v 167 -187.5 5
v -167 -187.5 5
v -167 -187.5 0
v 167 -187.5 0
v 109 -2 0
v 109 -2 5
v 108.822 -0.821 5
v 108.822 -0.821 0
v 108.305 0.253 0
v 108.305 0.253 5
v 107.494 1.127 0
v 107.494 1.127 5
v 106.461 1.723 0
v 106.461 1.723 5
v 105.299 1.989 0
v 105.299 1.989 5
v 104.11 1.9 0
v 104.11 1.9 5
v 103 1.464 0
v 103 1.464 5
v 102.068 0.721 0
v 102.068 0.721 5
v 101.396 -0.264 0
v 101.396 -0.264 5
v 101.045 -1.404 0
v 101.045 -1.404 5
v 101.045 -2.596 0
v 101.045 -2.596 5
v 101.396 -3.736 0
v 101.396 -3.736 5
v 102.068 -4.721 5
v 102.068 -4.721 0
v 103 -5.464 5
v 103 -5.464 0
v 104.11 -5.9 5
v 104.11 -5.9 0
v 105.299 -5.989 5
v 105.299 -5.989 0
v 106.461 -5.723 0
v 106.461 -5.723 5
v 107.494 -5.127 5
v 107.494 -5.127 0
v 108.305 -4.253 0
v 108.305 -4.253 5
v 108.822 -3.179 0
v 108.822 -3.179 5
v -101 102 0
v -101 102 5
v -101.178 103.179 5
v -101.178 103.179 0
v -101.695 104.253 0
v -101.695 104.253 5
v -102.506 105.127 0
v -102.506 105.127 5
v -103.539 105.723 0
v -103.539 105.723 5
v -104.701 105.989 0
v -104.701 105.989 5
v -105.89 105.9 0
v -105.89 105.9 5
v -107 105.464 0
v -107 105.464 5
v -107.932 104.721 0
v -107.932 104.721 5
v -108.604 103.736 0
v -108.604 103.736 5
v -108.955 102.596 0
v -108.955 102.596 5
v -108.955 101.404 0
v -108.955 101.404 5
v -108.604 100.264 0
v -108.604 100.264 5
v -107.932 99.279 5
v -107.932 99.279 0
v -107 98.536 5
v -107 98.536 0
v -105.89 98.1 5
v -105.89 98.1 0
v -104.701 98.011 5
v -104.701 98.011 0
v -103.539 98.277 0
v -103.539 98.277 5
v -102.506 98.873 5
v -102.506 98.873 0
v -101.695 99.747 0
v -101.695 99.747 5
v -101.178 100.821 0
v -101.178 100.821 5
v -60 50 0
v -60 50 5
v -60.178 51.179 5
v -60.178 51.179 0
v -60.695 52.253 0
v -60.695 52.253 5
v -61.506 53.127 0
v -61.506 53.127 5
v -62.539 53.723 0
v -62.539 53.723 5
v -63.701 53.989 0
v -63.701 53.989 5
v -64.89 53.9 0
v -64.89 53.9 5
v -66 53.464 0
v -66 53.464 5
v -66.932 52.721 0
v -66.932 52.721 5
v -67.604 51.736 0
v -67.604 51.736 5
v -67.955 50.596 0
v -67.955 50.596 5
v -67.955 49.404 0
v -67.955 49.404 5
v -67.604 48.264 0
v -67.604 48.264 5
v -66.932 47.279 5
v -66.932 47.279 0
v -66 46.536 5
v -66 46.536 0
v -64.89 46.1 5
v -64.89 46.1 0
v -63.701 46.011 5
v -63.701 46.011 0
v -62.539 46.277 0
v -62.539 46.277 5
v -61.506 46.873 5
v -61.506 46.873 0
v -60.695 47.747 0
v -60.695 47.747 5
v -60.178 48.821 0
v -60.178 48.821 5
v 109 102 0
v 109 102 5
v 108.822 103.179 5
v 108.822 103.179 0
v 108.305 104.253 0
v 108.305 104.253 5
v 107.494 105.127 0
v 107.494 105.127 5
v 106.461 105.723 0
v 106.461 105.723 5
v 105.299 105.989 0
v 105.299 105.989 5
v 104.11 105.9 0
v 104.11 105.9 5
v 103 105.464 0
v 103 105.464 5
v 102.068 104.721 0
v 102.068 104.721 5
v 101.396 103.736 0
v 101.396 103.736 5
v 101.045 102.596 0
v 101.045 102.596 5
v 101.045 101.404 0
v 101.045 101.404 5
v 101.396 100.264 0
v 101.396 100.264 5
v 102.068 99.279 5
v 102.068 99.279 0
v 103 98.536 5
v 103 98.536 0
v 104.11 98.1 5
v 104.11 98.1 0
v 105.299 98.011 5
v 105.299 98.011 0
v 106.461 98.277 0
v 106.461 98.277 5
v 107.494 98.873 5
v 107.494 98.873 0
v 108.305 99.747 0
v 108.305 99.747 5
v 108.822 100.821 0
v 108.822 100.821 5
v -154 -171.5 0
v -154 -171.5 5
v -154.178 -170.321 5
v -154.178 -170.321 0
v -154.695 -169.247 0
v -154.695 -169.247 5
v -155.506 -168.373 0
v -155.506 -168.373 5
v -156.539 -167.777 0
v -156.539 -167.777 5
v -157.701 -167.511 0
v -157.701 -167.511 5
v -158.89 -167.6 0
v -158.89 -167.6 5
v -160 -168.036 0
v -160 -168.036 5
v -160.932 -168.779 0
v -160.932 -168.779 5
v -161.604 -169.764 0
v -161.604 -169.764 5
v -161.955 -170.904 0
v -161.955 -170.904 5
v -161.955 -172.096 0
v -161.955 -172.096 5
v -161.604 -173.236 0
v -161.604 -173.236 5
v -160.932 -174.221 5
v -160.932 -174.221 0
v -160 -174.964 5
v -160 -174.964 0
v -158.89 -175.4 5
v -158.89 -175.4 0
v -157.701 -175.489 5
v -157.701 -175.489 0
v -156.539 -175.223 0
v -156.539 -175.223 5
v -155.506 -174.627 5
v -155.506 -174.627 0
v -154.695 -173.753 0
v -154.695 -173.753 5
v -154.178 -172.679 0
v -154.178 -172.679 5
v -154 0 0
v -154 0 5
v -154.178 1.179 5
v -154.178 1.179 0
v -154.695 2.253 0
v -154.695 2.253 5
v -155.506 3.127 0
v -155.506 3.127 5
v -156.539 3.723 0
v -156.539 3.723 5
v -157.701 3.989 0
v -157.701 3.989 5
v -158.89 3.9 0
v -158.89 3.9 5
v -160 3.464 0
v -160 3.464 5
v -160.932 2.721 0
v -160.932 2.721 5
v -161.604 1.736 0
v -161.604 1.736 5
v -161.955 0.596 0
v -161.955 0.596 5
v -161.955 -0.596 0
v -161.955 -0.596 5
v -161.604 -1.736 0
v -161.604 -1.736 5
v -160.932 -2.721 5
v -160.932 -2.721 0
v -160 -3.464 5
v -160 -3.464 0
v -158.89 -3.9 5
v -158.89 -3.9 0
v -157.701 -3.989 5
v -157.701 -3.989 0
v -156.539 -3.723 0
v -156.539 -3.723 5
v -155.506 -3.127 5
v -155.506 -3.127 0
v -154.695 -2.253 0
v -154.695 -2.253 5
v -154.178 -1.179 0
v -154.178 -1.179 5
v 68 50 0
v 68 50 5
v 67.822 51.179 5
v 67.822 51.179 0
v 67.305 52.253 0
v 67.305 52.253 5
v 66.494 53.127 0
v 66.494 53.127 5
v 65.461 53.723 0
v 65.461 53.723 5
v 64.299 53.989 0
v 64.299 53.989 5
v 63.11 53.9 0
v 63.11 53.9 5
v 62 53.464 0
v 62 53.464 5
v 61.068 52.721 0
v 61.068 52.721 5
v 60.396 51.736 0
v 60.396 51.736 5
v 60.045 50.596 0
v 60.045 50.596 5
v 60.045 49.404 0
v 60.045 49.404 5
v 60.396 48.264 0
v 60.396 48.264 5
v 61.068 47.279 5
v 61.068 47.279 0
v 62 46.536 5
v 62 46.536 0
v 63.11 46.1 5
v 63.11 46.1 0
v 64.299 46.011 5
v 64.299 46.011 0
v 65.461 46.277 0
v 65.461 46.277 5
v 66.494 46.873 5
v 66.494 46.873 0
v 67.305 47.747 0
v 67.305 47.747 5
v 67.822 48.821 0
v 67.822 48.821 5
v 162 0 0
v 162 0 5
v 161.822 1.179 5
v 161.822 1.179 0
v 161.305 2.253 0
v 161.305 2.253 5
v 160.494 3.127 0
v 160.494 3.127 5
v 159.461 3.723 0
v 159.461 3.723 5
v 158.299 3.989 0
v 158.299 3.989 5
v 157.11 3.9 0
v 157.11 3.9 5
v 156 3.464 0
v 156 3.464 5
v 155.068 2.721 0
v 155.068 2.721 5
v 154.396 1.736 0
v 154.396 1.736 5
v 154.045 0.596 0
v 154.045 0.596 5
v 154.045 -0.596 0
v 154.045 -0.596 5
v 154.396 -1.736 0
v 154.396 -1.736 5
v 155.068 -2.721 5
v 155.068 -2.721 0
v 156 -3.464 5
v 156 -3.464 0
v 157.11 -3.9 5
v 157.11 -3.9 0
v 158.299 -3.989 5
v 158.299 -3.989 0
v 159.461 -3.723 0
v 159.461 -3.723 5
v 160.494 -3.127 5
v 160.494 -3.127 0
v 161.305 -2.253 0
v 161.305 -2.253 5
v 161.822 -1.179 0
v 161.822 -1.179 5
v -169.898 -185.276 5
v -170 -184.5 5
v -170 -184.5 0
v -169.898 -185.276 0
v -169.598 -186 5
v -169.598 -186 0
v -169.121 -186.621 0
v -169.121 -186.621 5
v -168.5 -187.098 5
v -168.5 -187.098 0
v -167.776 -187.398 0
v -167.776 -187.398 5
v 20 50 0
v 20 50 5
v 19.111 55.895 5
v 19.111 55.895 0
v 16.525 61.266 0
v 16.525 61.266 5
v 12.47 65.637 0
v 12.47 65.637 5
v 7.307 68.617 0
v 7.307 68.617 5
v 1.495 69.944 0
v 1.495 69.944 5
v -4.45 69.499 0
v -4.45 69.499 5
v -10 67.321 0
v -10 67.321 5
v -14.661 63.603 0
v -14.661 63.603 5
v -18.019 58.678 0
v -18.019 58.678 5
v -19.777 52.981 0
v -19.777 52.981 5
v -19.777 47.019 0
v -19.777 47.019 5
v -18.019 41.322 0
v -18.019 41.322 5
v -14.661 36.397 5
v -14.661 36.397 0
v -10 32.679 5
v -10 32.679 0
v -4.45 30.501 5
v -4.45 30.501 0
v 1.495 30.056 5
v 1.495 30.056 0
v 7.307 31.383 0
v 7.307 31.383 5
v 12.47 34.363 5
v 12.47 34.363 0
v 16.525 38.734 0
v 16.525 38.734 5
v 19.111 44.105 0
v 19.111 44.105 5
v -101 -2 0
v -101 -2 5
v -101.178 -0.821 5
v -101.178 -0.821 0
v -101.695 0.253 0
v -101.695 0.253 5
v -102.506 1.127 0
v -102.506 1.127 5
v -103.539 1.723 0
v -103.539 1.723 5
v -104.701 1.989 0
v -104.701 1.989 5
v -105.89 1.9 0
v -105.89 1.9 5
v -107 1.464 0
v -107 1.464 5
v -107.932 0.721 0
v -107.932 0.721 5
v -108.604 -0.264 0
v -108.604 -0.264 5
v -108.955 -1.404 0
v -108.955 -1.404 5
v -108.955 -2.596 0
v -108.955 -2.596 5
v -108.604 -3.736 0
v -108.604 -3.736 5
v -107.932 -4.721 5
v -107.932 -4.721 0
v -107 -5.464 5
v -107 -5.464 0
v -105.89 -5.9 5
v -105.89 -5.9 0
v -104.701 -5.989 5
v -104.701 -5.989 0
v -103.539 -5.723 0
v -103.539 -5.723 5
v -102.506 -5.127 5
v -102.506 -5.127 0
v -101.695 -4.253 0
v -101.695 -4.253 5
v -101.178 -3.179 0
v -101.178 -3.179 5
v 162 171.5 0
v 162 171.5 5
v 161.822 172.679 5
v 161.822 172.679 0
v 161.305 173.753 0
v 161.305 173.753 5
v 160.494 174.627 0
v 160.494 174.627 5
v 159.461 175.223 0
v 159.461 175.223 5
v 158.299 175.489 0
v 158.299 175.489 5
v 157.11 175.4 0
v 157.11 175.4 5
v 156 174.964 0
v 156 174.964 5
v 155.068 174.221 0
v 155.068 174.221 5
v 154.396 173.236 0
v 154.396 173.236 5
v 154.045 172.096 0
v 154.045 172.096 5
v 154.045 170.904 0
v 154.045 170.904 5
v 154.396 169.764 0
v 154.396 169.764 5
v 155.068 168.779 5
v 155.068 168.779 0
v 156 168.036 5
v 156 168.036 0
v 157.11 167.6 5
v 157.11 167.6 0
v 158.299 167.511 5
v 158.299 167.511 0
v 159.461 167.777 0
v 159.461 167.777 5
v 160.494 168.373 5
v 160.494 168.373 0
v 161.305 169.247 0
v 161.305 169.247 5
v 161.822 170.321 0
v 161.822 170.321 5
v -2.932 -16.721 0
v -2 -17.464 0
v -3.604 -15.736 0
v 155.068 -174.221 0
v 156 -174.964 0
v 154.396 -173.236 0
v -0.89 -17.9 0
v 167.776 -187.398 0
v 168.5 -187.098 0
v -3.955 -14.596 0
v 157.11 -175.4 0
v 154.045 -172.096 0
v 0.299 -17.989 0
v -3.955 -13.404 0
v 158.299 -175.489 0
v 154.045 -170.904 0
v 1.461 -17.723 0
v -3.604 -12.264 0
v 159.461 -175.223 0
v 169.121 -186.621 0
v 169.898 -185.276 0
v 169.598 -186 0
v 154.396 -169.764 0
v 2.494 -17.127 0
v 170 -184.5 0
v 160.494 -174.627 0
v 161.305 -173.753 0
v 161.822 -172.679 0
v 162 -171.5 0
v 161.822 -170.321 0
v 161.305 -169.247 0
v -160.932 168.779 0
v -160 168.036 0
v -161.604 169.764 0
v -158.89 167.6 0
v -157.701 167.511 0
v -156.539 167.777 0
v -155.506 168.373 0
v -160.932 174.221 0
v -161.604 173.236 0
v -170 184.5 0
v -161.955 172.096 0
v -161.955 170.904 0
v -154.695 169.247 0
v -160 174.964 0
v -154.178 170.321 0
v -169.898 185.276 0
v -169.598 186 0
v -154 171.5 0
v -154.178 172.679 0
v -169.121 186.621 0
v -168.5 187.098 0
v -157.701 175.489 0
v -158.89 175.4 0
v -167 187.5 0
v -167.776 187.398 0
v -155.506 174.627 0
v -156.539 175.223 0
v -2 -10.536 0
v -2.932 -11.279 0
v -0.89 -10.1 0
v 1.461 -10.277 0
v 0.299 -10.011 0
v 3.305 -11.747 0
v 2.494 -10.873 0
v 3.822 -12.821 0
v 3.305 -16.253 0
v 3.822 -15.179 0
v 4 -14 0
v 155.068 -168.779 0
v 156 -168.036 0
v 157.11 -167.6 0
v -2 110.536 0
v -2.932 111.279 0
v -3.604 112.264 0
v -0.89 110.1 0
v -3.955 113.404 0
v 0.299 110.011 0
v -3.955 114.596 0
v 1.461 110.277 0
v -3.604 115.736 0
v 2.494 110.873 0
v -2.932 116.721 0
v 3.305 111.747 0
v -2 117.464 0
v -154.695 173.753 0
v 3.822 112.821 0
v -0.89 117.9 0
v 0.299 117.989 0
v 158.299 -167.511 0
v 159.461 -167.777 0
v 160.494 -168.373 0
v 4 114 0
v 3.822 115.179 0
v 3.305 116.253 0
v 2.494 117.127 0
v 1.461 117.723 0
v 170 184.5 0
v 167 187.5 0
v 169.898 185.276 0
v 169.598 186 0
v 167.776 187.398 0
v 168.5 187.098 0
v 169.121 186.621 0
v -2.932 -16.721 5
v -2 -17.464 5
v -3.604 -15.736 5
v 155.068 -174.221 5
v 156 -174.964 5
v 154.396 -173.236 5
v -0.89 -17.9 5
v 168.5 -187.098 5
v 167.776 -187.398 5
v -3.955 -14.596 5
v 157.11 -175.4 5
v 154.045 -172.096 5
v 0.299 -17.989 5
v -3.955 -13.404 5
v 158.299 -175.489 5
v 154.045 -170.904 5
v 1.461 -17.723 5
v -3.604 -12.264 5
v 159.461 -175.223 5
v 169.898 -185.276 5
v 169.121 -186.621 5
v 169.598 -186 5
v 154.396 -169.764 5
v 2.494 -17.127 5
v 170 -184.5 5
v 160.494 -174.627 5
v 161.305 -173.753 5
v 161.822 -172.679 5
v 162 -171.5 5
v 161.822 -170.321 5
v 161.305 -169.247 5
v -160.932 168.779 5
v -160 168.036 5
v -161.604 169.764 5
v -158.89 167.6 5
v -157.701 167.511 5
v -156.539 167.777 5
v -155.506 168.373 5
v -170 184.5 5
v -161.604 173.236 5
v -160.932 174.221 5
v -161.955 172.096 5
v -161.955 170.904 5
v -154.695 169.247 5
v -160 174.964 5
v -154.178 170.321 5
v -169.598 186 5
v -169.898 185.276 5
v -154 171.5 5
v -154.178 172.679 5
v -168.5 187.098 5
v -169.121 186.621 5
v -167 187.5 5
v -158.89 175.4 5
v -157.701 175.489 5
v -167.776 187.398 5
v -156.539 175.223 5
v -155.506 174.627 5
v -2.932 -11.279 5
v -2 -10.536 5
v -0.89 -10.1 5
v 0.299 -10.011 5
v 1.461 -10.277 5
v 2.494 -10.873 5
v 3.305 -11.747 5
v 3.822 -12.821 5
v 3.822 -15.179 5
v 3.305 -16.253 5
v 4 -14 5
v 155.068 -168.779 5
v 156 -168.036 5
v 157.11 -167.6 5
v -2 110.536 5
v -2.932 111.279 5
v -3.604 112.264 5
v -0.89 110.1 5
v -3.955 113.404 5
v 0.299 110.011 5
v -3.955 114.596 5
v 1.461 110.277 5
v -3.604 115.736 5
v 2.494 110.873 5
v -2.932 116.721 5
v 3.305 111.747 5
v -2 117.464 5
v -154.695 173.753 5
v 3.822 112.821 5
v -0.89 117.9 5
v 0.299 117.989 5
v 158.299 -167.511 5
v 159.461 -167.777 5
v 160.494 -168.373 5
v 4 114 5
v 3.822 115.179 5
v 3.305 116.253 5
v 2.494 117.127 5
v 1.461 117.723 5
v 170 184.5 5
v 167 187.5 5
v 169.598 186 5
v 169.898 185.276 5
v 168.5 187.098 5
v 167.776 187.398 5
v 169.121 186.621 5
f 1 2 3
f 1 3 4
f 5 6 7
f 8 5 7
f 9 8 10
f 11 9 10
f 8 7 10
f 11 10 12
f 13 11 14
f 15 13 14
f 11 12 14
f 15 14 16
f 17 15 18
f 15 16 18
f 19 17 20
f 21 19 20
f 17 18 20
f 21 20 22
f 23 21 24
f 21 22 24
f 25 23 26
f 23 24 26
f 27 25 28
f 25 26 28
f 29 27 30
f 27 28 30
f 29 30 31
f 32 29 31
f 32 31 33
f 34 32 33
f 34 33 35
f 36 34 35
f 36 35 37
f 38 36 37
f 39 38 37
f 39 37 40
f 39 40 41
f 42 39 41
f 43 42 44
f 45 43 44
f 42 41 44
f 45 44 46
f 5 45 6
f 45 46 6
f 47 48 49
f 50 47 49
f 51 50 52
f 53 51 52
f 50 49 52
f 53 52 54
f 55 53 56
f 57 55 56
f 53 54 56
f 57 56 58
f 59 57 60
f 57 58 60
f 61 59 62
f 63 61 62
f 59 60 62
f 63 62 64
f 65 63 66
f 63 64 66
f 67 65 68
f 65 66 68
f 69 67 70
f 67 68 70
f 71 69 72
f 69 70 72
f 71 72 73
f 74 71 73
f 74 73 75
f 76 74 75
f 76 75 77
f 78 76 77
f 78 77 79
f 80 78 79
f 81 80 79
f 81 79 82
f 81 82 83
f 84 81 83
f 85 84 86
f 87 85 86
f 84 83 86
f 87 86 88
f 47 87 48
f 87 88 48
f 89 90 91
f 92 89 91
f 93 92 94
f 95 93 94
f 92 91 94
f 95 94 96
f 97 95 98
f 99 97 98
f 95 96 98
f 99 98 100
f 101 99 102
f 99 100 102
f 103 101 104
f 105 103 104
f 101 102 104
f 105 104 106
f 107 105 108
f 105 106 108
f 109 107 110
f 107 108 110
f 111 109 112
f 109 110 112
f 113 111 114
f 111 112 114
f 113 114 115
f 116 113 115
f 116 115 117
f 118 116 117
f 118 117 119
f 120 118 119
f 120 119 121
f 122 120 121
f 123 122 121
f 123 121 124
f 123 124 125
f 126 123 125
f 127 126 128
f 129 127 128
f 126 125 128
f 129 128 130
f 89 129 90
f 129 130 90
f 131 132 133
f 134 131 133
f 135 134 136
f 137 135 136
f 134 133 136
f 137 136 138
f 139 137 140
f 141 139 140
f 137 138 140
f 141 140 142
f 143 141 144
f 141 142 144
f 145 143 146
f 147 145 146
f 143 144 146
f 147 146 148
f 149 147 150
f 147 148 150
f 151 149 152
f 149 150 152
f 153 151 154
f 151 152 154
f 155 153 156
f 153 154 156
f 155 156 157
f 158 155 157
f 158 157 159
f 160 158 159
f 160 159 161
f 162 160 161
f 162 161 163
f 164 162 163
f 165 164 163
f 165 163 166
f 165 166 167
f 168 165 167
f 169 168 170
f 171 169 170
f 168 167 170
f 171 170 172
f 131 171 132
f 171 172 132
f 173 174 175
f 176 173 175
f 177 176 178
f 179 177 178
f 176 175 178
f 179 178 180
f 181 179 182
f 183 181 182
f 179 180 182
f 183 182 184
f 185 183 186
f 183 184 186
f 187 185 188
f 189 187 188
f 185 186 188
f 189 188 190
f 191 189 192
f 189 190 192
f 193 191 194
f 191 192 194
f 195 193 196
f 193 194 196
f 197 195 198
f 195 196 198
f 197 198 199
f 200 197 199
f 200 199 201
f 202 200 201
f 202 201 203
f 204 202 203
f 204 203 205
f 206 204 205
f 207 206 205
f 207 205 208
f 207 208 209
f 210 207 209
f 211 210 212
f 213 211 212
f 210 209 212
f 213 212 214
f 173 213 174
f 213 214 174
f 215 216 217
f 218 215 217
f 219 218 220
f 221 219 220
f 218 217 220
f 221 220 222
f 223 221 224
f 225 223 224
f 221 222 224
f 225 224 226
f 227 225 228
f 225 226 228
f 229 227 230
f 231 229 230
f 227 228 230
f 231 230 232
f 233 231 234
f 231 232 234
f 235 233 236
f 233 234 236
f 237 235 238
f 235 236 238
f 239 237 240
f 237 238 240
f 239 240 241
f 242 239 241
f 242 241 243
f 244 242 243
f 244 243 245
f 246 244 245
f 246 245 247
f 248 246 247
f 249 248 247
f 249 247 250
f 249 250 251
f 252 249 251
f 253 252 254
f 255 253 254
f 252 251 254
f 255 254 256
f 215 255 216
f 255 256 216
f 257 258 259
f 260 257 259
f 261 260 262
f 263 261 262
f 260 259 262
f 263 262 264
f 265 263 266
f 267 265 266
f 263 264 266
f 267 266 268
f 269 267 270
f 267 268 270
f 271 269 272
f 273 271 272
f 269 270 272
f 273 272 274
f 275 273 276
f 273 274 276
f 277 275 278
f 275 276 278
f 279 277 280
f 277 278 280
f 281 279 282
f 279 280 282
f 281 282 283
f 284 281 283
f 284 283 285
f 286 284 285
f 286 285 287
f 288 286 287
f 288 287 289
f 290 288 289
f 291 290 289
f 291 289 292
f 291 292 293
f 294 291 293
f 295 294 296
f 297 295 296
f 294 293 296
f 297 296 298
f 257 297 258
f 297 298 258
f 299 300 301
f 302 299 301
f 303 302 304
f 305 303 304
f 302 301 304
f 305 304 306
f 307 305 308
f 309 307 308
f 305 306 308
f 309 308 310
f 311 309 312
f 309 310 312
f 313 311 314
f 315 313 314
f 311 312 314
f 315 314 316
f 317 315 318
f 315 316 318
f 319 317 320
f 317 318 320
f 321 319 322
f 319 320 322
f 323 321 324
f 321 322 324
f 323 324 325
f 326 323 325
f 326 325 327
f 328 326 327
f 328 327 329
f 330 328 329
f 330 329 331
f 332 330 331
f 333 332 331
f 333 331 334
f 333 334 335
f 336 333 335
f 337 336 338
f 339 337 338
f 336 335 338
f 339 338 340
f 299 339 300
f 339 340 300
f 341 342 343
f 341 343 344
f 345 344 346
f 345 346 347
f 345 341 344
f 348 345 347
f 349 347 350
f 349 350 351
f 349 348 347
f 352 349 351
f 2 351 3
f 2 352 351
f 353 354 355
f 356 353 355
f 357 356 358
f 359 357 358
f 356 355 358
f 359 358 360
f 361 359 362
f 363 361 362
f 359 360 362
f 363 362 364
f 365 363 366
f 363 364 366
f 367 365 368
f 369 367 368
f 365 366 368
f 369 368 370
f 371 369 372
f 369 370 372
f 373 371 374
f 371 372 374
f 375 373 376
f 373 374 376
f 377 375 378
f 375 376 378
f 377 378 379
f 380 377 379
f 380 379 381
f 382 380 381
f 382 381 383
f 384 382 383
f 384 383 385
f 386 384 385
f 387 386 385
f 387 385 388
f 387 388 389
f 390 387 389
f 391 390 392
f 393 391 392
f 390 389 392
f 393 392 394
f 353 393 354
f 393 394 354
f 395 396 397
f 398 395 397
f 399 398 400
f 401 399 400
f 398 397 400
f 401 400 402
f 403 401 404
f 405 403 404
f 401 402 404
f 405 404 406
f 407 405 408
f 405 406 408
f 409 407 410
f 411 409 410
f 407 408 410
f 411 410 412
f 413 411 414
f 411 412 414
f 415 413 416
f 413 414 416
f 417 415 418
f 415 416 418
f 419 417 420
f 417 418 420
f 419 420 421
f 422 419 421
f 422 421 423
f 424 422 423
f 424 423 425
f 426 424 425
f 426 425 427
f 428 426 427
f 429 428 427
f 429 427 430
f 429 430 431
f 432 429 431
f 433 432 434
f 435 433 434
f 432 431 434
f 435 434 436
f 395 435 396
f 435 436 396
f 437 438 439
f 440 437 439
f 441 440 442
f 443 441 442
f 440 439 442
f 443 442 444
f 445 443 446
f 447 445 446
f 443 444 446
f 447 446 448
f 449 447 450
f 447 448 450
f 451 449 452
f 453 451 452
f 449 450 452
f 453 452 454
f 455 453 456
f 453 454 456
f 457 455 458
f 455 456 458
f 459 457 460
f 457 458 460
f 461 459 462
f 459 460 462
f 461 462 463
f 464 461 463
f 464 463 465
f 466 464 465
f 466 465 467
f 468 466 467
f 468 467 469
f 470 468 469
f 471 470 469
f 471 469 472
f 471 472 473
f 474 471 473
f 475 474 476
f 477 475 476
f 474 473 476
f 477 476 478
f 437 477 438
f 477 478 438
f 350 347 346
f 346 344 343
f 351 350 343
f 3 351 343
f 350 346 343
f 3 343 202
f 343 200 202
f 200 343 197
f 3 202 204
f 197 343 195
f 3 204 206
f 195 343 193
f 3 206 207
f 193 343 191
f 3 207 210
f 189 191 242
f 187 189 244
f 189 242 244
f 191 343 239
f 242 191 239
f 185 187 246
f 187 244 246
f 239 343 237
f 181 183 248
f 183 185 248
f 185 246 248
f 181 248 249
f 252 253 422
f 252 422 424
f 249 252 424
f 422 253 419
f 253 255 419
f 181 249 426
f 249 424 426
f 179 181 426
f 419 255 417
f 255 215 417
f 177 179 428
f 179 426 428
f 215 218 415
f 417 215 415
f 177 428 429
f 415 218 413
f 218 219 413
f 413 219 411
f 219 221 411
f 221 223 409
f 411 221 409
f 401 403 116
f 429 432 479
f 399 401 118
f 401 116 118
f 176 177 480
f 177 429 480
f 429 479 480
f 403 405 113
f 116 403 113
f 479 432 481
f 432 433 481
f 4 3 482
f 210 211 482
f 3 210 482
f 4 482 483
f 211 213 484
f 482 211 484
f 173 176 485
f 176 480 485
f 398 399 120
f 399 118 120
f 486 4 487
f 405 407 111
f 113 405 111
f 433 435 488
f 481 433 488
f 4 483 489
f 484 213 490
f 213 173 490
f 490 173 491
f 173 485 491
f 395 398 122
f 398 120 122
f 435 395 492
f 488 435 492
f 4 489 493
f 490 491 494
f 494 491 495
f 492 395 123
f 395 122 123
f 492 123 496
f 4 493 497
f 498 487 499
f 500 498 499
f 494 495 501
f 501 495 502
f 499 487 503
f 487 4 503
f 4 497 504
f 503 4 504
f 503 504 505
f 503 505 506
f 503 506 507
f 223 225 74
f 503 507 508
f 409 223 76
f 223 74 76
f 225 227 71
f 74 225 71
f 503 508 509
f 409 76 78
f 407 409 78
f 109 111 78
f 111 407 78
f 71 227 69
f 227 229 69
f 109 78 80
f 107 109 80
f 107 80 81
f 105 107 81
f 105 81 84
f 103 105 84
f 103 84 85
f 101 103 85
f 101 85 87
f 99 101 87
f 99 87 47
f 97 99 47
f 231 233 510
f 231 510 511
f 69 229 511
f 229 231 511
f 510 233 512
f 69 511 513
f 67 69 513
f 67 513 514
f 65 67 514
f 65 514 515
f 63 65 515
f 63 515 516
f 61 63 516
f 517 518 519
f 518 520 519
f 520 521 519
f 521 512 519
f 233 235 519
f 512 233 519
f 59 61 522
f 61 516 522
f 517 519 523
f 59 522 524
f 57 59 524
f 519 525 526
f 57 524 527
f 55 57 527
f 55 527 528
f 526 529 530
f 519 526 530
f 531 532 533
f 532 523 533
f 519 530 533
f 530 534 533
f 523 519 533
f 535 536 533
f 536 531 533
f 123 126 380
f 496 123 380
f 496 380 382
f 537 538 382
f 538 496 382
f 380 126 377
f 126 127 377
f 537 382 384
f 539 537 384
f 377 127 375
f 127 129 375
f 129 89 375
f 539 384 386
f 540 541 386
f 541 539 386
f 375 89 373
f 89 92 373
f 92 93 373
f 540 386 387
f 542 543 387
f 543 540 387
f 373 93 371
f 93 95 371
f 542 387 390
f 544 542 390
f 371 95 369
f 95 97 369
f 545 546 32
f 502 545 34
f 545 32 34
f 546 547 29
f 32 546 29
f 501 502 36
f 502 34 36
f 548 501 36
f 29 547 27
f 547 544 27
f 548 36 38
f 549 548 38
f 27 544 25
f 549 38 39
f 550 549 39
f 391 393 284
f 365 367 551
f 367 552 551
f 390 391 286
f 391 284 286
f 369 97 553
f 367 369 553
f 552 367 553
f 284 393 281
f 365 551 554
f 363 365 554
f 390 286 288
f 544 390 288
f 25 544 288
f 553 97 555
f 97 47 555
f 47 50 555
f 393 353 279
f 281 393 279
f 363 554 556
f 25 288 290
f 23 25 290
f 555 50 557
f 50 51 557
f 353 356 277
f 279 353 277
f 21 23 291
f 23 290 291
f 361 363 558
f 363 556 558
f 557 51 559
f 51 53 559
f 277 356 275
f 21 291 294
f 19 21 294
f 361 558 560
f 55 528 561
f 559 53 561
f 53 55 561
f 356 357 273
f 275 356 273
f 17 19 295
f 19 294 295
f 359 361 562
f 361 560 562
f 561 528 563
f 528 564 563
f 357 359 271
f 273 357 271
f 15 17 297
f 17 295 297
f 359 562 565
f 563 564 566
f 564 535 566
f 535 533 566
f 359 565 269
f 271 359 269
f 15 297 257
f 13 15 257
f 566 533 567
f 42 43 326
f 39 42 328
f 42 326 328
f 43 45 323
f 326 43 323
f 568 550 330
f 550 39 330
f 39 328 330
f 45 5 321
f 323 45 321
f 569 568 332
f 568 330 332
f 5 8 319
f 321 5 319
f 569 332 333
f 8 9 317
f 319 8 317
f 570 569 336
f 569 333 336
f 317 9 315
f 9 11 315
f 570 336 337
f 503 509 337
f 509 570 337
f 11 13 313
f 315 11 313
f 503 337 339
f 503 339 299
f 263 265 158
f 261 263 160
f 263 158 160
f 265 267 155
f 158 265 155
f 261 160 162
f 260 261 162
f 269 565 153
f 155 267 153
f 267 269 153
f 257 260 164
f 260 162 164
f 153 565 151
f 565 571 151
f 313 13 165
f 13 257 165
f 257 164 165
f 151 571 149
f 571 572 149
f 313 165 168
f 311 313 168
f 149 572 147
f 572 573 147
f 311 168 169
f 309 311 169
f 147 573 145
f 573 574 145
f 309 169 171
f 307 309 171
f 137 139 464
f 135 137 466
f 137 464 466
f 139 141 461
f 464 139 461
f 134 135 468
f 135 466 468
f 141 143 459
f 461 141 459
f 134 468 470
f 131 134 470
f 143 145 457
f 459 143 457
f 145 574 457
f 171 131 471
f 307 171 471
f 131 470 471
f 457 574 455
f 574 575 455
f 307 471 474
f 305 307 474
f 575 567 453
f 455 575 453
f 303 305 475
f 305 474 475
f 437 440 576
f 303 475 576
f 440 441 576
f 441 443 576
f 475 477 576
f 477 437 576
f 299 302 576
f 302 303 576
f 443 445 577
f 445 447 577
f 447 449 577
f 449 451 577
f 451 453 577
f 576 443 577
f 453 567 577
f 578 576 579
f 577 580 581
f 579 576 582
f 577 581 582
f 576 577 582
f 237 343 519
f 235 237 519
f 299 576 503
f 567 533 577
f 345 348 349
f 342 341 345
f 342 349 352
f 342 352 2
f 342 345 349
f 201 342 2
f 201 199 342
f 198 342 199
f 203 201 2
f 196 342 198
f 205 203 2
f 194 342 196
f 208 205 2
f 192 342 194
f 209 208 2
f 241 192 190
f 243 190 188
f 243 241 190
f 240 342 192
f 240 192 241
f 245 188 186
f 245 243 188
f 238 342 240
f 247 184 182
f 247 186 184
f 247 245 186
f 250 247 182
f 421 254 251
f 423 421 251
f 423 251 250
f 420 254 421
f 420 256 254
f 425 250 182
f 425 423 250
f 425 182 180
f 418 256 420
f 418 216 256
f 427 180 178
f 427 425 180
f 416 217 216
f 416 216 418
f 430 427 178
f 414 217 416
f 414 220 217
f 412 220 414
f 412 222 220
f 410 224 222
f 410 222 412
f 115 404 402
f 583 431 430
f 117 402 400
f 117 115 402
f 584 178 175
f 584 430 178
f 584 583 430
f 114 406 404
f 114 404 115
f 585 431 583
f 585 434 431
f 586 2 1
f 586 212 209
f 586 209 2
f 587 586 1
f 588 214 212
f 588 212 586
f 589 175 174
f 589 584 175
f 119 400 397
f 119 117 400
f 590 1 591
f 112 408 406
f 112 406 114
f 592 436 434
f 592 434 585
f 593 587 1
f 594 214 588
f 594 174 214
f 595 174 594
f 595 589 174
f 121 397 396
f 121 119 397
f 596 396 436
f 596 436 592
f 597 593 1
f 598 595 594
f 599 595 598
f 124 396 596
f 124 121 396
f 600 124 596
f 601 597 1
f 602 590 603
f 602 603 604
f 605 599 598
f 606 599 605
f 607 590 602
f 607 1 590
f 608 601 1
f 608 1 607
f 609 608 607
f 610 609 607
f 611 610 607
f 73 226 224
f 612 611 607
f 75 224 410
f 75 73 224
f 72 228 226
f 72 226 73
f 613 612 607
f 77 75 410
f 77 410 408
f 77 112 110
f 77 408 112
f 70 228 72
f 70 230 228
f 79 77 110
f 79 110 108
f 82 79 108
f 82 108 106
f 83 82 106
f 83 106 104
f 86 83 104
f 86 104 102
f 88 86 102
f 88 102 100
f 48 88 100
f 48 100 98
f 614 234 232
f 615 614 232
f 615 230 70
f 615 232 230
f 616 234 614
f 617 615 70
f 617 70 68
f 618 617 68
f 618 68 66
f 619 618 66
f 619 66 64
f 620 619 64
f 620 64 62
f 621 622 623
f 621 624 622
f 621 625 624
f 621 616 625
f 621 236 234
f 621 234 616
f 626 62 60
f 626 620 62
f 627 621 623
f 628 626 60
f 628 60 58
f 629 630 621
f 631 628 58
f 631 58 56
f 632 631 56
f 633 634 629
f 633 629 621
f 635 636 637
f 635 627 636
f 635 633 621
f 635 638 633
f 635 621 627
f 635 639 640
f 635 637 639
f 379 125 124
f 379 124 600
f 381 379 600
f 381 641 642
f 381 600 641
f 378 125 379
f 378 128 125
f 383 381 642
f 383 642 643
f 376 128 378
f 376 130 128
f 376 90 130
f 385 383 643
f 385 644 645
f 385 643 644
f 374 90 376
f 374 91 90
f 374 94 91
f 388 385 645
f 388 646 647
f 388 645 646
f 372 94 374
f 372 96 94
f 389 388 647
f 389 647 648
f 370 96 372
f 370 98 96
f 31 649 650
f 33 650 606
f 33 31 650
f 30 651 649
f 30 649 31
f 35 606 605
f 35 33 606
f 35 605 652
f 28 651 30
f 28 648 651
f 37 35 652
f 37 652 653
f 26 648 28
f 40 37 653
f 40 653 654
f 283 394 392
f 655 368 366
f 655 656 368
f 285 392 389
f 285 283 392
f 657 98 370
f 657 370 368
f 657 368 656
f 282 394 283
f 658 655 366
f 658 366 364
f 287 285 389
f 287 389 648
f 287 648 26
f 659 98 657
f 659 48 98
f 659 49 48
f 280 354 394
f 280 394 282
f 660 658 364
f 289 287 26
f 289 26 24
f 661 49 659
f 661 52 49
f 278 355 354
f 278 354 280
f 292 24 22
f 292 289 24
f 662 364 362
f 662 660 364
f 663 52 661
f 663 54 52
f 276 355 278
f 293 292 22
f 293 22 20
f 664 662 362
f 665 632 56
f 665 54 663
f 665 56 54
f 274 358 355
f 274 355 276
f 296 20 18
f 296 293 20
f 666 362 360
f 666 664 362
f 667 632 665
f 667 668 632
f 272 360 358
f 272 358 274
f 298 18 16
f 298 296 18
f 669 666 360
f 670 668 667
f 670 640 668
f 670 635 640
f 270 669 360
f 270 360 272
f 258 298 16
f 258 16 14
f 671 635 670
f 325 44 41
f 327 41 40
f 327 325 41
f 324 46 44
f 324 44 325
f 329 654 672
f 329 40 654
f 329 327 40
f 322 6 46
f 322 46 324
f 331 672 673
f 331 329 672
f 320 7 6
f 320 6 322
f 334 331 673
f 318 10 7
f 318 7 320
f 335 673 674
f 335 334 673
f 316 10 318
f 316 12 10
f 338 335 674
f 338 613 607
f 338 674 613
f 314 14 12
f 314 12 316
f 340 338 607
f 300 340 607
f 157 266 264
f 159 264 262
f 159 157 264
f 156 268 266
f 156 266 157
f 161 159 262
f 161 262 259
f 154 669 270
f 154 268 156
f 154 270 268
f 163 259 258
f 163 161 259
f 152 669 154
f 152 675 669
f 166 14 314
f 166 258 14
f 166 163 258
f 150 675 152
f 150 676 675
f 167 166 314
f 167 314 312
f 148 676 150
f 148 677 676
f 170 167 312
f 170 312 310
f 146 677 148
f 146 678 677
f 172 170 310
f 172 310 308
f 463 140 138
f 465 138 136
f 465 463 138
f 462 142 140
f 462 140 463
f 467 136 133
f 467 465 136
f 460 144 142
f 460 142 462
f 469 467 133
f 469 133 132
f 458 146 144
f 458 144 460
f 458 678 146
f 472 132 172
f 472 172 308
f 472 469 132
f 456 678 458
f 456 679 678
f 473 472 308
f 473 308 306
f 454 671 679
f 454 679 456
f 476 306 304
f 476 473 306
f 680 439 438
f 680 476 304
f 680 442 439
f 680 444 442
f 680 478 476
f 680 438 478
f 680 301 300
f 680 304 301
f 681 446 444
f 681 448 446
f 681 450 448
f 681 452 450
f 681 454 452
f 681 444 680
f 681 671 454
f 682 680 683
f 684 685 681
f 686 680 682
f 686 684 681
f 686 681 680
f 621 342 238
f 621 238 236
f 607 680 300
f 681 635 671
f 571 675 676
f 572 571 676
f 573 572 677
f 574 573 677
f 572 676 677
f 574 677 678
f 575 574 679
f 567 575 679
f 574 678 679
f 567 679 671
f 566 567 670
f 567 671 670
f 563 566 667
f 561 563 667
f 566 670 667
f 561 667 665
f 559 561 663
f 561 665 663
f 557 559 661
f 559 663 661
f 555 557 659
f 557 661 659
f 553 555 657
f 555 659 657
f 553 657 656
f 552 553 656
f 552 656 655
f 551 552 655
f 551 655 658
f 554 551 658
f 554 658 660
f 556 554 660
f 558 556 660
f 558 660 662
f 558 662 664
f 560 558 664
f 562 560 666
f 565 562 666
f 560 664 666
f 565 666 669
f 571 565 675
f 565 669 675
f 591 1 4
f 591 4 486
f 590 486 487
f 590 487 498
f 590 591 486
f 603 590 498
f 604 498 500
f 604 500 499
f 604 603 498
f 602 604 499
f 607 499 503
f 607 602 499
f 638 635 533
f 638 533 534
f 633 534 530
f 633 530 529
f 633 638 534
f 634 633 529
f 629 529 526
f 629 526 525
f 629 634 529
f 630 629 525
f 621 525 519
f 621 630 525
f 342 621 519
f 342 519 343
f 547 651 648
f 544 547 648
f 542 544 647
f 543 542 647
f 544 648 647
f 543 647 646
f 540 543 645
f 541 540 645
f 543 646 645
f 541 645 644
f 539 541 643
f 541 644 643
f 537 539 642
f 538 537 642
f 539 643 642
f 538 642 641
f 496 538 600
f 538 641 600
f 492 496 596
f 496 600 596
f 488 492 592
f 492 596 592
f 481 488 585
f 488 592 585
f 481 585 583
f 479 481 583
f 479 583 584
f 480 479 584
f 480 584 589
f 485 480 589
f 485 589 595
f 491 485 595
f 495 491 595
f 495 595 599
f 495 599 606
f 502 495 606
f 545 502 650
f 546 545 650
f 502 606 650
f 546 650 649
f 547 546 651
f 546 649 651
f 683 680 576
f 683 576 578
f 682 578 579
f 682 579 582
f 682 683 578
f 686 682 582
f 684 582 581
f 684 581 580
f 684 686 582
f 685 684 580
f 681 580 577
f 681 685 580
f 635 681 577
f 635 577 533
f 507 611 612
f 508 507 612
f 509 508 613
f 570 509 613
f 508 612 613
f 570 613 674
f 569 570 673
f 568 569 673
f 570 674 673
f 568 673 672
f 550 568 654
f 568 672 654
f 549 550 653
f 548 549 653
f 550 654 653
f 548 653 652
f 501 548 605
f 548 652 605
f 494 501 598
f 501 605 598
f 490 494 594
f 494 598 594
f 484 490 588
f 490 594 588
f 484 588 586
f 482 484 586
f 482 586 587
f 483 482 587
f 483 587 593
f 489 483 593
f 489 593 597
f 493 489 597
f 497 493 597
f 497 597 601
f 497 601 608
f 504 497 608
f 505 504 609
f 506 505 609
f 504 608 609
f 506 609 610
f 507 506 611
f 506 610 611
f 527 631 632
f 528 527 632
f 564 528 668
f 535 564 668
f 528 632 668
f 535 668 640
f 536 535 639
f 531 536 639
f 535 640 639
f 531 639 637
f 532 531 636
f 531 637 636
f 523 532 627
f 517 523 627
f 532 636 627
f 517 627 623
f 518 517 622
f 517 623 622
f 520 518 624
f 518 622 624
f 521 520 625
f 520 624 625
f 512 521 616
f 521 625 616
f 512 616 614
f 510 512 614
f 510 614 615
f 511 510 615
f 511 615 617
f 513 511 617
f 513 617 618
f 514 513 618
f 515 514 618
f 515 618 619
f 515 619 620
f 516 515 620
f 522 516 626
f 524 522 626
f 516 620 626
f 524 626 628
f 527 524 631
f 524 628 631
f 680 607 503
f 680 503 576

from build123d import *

# Parameters (mm, degrees)
SKETCH1_R           = 20
SKETCH1_R_2         = 4
BOSS_EXTRUDE1_DEPTH = 5


with BuildPart() as part:
    # Sketch1 → Boss-Extrude1 (new body)
    with BuildSketch(Plane.XY.offset(5)):
        with BuildLine():
            Line((-170, 184.5), (-170, -184.5))
            ThreePointArc((-170, -184.5), (-169.121320344, -186.621320344), (-167, -187.5))
            Line((-167, -187.5), (167, -187.5))
            ThreePointArc((167, -187.5), (169.121320344, -186.621320344), (170, -184.5))
            Line((170, -184.5), (170, 184.5))
            ThreePointArc((170, 184.5), (169.121320344, 186.621320344), (167, 187.5))
            Line((167, 187.5), (-167, 187.5))
            ThreePointArc((-167, 187.5), (-169.121320344, 186.621320344), (-170, 184.5))
        make_face()
        with Locations((0, 50)):
            Circle(SKETCH1_R, mode=Mode.SUBTRACT)
        with Locations((-64, 50)):
            Circle(SKETCH1_R_2, mode=Mode.SUBTRACT)
        with Locations((0, 114)):
            Circle(SKETCH1_R_2, mode=Mode.SUBTRACT)
        with Locations((64, 50)):
            Circle(SKETCH1_R_2, mode=Mode.SUBTRACT)
        with Locations((0, -14)):
            Circle(SKETCH1_R_2, mode=Mode.SUBTRACT)
        with Locations((158, 0)):
            Circle(SKETCH1_R_2, mode=Mode.SUBTRACT)
        with Locations((-158, 0)):
            Circle(SKETCH1_R_2, mode=Mode.SUBTRACT)
        with Locations((158, 171.5)):
            Circle(SKETCH1_R_2, mode=Mode.SUBTRACT)
        with Locations((-158, 171.5)):
            Circle(SKETCH1_R_2, mode=Mode.SUBTRACT)
        with Locations((-158, -171.5)):
            Circle(SKETCH1_R_2, mode=Mode.SUBTRACT)
        with Locations((158, -171.5)):
            Circle(SKETCH1_R_2, mode=Mode.SUBTRACT)
        with Locations((-105, 102)):
            Circle(SKETCH1_R_2, mode=Mode.SUBTRACT)
        with Locations((-105, -2)):
            Circle(SKETCH1_R_2, mode=Mode.SUBTRACT)
        with Locations((105, 102)):
            Circle(SKETCH1_R_2, mode=Mode.SUBTRACT)
        with Locations((105, -2)):
            Circle(SKETCH1_R_2, mode=Mode.SUBTRACT)
    extrude(amount=-BOSS_EXTRUDE1_DEPTH)


solid = part.part
